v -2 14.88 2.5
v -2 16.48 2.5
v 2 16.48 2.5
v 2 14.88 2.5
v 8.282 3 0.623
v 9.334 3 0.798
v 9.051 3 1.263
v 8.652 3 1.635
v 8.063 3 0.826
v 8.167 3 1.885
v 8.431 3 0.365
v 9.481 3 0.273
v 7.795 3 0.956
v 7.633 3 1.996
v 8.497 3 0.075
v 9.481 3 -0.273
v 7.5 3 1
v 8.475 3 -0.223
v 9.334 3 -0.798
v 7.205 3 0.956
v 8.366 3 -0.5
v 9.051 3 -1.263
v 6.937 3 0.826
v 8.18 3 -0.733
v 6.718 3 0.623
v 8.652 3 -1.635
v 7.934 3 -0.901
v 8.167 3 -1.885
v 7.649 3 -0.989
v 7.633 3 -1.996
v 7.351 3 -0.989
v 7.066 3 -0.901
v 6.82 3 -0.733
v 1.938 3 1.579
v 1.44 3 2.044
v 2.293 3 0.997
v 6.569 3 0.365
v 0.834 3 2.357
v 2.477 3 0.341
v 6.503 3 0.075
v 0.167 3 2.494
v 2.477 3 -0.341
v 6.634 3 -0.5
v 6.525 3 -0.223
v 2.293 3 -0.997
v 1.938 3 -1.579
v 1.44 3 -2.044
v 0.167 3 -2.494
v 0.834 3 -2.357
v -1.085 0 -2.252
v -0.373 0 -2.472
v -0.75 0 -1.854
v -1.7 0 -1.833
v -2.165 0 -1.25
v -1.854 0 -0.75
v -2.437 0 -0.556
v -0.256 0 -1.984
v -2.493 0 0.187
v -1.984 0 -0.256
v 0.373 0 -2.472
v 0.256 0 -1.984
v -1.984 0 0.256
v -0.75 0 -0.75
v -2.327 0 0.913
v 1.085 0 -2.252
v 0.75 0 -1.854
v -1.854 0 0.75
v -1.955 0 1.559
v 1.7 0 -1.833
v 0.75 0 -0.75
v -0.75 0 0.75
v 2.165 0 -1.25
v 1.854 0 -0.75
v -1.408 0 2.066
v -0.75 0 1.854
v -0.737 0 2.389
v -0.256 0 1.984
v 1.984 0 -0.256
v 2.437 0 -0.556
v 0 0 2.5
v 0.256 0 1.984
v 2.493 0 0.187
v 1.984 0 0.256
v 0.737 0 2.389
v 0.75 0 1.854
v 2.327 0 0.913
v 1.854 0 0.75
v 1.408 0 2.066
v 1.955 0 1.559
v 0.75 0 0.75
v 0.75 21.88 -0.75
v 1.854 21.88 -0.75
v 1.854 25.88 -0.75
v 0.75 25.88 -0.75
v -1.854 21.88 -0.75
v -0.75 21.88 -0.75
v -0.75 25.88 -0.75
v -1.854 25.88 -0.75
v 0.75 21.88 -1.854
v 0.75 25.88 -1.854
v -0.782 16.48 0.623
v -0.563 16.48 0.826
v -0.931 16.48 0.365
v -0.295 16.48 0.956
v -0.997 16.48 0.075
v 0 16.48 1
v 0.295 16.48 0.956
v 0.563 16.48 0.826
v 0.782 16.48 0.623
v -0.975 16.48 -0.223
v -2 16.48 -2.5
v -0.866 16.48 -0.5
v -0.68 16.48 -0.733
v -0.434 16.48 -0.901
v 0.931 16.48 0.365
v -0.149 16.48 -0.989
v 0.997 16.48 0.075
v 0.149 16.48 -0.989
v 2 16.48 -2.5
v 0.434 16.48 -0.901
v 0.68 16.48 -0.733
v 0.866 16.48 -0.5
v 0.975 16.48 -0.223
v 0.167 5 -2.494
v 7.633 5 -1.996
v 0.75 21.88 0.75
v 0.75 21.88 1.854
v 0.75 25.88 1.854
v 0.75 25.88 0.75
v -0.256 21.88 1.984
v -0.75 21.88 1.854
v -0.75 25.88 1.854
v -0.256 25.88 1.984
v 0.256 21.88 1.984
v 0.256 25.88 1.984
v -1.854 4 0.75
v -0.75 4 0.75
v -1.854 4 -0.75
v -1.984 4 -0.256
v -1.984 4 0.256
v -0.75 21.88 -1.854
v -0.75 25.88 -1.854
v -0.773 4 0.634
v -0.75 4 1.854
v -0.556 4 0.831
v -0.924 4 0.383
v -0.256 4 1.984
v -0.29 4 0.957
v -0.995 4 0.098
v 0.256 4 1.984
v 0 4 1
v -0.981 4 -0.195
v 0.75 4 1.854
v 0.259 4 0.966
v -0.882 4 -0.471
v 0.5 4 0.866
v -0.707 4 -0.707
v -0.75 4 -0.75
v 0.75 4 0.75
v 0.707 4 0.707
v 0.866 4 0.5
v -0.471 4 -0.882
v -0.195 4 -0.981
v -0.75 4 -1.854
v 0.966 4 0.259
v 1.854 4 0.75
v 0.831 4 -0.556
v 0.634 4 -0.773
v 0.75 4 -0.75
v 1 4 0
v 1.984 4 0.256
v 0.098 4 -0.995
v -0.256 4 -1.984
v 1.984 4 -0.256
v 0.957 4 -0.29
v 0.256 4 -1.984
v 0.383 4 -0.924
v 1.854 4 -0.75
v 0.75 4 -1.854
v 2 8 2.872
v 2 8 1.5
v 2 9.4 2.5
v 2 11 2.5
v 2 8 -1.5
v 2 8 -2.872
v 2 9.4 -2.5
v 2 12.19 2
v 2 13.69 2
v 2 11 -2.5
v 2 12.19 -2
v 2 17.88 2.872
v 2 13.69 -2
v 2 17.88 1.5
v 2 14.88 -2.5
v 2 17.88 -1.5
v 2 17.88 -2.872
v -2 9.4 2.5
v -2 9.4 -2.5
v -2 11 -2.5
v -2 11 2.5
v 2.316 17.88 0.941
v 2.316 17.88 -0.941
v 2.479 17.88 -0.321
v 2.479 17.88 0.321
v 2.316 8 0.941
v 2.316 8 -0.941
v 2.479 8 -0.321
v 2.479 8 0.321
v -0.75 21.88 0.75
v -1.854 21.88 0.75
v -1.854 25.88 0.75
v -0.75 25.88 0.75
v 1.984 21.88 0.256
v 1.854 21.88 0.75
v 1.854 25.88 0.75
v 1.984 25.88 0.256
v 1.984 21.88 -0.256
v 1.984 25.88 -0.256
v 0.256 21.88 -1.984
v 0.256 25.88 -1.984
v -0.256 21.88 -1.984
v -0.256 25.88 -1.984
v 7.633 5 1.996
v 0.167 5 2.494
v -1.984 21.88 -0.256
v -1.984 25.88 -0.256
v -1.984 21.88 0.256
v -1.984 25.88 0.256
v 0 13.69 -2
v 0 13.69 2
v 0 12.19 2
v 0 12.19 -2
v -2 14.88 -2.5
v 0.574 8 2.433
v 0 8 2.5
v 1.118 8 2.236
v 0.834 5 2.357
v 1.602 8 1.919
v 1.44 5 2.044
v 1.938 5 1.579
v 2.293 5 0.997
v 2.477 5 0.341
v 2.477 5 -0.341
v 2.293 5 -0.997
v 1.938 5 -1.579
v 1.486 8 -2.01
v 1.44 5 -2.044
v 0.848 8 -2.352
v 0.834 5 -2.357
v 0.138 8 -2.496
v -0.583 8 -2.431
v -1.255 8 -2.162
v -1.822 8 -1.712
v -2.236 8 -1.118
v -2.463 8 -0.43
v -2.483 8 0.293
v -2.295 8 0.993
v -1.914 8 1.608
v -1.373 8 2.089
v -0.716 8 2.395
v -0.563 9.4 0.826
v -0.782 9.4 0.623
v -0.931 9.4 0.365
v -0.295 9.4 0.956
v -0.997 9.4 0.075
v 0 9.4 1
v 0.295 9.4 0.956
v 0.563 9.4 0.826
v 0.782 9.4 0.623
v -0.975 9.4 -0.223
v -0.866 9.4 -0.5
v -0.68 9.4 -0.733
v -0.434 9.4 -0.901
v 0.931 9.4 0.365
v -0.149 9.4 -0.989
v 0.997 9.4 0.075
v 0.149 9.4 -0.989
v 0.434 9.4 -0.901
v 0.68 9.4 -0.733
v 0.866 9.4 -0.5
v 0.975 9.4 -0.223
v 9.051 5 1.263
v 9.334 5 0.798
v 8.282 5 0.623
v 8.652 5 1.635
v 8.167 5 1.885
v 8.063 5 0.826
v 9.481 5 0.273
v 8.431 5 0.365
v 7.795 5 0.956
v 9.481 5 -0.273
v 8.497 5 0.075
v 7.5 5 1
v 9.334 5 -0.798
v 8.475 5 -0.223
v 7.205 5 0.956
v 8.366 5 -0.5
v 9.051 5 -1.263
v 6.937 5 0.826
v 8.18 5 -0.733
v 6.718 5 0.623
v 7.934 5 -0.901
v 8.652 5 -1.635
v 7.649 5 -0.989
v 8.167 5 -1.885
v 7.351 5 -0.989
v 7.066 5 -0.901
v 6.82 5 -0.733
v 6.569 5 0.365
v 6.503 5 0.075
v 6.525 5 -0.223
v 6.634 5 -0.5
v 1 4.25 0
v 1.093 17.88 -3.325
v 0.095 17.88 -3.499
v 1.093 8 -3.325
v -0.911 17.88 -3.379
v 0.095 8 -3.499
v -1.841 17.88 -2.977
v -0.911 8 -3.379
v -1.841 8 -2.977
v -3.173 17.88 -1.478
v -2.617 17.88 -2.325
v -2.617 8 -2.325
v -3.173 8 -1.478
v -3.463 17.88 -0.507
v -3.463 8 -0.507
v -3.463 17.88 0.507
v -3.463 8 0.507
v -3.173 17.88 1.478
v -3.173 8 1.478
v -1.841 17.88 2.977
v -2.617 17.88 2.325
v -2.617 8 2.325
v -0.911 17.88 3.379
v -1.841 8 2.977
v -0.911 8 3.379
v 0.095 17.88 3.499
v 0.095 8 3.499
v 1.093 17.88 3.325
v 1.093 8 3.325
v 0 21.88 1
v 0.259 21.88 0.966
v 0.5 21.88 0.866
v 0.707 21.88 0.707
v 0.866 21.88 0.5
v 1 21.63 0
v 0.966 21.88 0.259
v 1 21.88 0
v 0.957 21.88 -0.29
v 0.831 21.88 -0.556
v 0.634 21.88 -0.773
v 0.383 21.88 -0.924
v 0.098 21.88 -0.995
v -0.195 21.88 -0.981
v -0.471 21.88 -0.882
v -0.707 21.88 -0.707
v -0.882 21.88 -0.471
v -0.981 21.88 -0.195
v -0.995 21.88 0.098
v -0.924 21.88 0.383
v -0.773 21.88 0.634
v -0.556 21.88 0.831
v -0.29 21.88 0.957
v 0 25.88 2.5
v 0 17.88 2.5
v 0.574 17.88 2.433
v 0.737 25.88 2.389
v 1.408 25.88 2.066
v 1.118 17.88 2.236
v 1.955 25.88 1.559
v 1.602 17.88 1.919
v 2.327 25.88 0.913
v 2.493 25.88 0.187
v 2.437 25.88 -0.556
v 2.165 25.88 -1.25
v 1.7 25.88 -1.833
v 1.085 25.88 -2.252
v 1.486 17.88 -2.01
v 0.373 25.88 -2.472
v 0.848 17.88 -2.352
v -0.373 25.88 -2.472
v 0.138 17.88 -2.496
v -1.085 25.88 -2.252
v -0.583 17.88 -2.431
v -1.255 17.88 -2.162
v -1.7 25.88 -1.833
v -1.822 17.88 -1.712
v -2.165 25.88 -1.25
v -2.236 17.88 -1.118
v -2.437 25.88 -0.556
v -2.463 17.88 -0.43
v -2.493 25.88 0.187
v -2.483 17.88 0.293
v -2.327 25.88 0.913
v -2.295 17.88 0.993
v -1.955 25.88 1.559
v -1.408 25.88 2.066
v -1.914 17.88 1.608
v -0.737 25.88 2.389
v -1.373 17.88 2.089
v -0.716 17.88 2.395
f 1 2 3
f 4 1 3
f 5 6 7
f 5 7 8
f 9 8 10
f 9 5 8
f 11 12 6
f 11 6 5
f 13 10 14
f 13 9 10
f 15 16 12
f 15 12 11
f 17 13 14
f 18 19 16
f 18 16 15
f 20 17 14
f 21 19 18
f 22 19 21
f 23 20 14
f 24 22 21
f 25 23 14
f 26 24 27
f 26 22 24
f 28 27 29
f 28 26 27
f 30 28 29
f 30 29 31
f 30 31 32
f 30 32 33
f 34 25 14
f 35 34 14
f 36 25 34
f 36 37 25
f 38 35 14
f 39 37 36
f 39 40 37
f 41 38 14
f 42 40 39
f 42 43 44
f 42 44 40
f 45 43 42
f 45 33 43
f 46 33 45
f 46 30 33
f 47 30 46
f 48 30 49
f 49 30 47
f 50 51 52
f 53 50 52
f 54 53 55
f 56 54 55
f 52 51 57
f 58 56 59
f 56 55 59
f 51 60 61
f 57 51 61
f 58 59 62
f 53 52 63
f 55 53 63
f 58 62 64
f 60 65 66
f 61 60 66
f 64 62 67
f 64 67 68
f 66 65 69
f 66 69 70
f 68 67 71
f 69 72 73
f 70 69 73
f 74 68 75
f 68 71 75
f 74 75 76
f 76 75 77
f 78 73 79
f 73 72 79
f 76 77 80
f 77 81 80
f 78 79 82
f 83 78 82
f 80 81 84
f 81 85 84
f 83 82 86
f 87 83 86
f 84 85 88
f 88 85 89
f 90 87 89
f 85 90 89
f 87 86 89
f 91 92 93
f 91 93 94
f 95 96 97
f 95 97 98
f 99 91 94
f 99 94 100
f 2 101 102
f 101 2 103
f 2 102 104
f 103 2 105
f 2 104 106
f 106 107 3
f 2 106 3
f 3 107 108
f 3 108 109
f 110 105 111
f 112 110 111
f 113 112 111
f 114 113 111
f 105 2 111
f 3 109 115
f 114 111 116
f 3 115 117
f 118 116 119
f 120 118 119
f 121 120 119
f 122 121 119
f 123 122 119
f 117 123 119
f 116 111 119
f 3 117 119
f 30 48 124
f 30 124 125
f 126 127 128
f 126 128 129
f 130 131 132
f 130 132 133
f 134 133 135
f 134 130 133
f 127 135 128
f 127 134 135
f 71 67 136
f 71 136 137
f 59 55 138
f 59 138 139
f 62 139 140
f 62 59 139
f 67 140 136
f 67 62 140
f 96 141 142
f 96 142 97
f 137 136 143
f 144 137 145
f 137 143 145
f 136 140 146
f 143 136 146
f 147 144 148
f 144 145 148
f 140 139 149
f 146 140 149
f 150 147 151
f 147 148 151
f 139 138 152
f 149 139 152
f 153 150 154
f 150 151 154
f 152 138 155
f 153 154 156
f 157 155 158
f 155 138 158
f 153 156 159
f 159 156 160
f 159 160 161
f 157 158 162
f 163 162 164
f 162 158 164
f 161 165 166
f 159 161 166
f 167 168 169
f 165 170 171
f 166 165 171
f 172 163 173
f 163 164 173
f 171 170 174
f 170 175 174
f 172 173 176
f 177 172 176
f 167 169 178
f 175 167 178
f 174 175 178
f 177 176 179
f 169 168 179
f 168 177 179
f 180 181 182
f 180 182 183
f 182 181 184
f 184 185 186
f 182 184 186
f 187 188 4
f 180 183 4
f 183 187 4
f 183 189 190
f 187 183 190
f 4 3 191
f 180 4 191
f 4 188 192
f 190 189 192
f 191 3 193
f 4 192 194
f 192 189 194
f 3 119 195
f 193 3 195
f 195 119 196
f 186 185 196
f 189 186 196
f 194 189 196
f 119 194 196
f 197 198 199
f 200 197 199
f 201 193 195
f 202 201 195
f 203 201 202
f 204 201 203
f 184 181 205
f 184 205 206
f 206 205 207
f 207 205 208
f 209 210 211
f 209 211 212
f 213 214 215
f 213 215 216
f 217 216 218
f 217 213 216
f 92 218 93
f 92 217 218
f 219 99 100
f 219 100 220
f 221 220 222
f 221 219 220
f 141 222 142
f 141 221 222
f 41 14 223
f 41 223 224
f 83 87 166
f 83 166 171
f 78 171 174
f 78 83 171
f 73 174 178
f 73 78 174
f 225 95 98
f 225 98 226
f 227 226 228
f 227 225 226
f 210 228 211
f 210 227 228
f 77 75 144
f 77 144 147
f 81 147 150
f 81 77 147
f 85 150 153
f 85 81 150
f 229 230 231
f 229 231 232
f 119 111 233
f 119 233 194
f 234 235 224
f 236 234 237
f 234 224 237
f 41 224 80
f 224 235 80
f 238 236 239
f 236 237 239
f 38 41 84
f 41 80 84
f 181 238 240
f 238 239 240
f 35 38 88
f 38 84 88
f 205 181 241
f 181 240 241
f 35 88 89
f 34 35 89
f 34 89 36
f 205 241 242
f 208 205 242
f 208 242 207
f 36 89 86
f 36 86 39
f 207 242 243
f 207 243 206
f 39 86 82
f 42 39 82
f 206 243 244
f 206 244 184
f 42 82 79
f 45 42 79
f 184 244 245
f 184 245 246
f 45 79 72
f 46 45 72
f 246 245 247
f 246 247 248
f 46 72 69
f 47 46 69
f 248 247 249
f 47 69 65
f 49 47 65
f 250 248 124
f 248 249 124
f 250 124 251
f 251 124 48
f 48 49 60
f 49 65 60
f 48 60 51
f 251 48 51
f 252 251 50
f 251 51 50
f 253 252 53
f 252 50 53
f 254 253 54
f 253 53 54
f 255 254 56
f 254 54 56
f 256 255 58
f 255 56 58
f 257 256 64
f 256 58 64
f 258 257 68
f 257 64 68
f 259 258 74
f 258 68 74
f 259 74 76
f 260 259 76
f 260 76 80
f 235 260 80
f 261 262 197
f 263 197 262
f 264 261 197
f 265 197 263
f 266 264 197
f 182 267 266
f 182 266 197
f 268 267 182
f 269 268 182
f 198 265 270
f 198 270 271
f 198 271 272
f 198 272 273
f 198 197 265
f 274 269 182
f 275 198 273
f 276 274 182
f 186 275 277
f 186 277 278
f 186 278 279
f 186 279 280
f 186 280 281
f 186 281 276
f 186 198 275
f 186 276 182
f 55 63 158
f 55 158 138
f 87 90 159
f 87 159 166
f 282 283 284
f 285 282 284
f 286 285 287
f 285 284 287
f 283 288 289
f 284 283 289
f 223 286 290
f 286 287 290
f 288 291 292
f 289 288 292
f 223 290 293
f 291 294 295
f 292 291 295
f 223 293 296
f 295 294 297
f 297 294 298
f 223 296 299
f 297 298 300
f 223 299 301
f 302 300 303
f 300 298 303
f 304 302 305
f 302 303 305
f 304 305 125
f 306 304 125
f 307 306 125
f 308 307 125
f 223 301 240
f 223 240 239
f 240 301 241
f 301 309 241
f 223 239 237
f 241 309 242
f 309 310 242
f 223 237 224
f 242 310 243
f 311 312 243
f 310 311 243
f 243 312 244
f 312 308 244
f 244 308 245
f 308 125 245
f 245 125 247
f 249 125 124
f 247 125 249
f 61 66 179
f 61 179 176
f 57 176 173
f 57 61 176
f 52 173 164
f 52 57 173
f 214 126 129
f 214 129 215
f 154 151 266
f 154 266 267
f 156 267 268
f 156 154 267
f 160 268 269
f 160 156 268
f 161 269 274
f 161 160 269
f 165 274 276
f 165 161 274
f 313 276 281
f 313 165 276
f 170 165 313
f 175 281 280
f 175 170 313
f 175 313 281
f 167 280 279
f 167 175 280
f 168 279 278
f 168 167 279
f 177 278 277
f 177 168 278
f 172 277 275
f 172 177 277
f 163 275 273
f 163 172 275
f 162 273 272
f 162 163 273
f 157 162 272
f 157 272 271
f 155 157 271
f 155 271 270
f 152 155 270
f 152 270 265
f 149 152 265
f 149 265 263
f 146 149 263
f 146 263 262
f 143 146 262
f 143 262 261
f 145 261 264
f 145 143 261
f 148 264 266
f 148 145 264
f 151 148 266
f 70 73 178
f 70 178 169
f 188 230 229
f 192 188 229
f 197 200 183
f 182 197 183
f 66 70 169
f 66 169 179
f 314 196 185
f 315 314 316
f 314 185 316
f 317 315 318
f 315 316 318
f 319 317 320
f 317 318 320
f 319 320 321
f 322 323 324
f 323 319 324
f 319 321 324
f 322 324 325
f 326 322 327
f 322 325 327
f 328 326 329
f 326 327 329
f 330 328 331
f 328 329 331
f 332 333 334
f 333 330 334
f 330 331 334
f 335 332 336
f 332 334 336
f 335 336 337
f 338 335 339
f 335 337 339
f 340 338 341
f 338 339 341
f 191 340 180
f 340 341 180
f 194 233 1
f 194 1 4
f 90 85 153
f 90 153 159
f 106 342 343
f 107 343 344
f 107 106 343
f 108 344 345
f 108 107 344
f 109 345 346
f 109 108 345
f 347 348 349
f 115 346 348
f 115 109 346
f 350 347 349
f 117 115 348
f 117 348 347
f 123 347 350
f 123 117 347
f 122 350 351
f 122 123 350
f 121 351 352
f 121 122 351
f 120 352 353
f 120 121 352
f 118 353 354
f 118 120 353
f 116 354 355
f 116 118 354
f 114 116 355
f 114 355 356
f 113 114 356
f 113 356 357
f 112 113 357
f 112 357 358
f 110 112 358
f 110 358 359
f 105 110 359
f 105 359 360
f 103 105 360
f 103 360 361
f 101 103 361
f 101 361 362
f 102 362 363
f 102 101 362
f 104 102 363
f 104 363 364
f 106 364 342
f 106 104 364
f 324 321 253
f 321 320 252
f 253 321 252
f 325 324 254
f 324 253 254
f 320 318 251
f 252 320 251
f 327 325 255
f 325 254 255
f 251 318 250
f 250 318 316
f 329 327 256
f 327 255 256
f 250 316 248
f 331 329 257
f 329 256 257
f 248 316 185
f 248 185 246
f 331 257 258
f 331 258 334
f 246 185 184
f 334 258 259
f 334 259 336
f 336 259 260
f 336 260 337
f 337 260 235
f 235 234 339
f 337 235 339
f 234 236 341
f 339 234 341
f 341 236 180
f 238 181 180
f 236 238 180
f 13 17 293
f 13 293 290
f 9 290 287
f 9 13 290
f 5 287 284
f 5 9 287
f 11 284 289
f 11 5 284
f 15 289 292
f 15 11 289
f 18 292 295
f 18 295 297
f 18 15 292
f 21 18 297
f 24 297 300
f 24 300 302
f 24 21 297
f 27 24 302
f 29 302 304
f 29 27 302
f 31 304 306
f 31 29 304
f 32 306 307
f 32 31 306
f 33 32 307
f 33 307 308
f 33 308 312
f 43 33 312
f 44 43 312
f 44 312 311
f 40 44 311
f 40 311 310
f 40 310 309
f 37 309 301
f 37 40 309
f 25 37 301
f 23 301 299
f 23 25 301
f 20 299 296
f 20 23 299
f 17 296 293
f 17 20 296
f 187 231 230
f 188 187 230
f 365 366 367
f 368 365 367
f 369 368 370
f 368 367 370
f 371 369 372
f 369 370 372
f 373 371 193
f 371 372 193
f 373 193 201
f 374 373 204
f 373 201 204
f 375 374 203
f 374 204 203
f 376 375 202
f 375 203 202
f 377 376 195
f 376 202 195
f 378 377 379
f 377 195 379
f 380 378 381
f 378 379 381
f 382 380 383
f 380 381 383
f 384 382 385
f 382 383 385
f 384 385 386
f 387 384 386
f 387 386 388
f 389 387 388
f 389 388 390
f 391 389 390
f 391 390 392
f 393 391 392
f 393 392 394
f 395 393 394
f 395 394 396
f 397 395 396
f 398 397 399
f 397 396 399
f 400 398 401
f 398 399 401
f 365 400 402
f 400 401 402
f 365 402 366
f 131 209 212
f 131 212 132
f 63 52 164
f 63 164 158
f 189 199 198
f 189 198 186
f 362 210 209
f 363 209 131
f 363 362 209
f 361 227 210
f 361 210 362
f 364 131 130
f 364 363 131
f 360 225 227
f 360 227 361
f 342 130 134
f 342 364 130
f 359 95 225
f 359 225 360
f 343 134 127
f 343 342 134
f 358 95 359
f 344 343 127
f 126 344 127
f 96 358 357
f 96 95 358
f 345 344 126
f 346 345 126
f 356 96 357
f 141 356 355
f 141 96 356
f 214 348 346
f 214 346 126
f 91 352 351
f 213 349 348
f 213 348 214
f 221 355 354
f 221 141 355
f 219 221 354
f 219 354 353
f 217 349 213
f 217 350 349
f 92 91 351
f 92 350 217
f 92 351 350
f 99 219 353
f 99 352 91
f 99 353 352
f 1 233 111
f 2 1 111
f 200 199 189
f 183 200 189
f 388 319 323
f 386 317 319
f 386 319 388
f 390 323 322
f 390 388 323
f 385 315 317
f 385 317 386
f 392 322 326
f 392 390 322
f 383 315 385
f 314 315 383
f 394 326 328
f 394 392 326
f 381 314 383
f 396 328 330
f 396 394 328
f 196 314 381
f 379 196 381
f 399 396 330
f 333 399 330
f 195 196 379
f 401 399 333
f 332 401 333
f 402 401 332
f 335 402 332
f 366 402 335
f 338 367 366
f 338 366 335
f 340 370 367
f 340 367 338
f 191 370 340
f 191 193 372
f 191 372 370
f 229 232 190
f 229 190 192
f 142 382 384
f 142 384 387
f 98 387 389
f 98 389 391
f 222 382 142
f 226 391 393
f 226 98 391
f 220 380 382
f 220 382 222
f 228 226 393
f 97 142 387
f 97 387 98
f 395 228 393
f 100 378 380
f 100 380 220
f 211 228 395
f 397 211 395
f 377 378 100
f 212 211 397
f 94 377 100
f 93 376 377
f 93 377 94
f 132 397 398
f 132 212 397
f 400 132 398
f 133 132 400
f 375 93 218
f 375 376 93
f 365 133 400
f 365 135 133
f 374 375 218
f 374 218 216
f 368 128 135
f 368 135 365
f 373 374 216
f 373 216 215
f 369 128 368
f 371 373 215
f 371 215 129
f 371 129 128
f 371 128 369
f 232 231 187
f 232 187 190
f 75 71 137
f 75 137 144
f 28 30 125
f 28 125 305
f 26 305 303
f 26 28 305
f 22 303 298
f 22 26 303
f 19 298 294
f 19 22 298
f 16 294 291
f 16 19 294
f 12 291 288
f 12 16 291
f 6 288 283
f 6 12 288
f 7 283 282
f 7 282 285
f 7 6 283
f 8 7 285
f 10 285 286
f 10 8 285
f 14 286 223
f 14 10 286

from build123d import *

# Parameters (mm, degrees)
SKETCH_1_R                = 2.5
EXTRUDE_1_DEPTH           = 25.88
EXTRUDE_START             = 3
SKETCH_2_R                = 1
EXTRUDE_2_DEPTH           = 2
CUT_EXTRUDE_1_DEPTH       = 4
CUT_EXTRUDE_START         = 21.88
CUT_EXTRUDE_2_DEPTH       = 4
SKETCH_6_R                = 0.25
CUT_EXTRUDE_3_DEPTH       = 0.25
CUT_EXTRUDE_START_2       = 4.25
SKETCH_7_R                = 0.25
CUT_EXTRUDE_4_DEPTH       = 0.25
EXTRUDE_START_2           = 8
SKETCH_17_R               = 3.5
EXTRUDE_5_DEPTH           = 9.88
SKETCH_18_R               = 1
CUT_EXTRUDE_11_DEPTH      = 10
CUT_EXTRUDE_START_3       = 15.88
SKETCH_19_R               = 1
CUT_EXTRUDE_12_DEPTH      = 10
CUT_EXTRUDE_13_DEPTH      = 2.5
CUT_EXTRUDE_13_DEPTH_BACK = 2.5
SKETCH_20_W               = 4
SKETCH_20_H               = 1.6
CUT_EXTRUDE_14_DEPTH      = 28.789825476
CUT_EXTRUDE_14_DEPTH_BACK = 28.789825476
SKETCH_21_W               = 1.5
SKETCH_21_H               = 9.88
SKETCH_22_W               = 4
SKETCH_22_H               = 1.5
CUT_EXTRUDE_15_DEPTH      = 28.789825476


with BuildPart() as part:
    # 草图1 → 凸台-拉伸1 (new body)
    with BuildSketch(Plane(origin=(0, 0, 0), x_dir=(1, 0, 0), z_dir=(0, 1, 0))):
        with Locations(Location((0, 0, 0), (0, 0, 270))):
            Circle(SKETCH_1_R)
    extrude(amount=EXTRUDE_1_DEPTH)

    # 草图2 → 凸台-拉伸2 (add)
    with BuildSketch(Plane(origin=(0, 0, 0), x_dir=(1, 0, 0), z_dir=(0, 1, 0)).offset(EXTRUDE_START)):
        with BuildLine():
            Line((0.166666667, 2.494438258), (7.633333333, 1.995550606))
            ThreePointArc((7.633333333, 1.995550606), (9.5, 0), (7.633333333, -1.995550606))
            Line((7.633333333, -1.995550606), (0.166666667, -2.494438258))
            ThreePointArc((0.166666667, -2.494438258), (-2.5, 0), (0.166666667, 2.494438258))
        make_face()
        with Locations(Location((7.5, 0, 0), (0, 0, 270))):
            Circle(SKETCH_2_R, mode=Mode.SUBTRACT)
    extrude(amount=EXTRUDE_2_DEPTH)

    # 草图3 → 切除-拉伸1 (cut)
    with BuildSketch(Plane(origin=(0, 0, 0), x_dir=(1, 0, 0), z_dir=(0, 1, 0))):
        with BuildLine():
            Line((-1.854049622, -0.75), (-0.75, -0.75))
            Line((-0.75, -0.75), (-0.75, -1.854049622))
            ThreePointArc((-0.75, -1.854049622), (0, -2), (0.75, -1.854049622))
            Line((0.75, -1.854049622), (0.75, -0.75))
            Line((0.75, -0.75), (1.854049622, -0.75))
            ThreePointArc((1.854049622, -0.75), (2, 0), (1.854049622, 0.75))
            Line((1.854049622, 0.75), (0.75, 0.75))
            Line((0.75, 0.75), (0.75, 1.854049622))
            ThreePointArc((0.75, 1.854049622), (0, 2), (-0.75, 1.854049622))
            Line((-0.75, 1.854049622), (-0.75, 0.75))
            Line((-0.75, 0.75), (-1.854049622, 0.75))
            ThreePointArc((-1.854049622, 0.75), (-2, 0), (-1.854049622, -0.75))
        make_face()
    extrude(amount=CUT_EXTRUDE_1_DEPTH, mode=Mode.SUBTRACT)

    # 草图5 → 切除-拉伸2 (cut)
    with BuildSketch(Plane(origin=(0, 0, 0), x_dir=(1, 0, 0), z_dir=(0, 1, 0)).offset(CUT_EXTRUDE_START)):
        with BuildLine():
            Line((1.854049622, 0.75), (0.75, 0.75))
            Line((0.75, 0.75), (0.75, 1.854049622))
            ThreePointArc((0.75, 1.854049622), (0, 2), (-0.75, 1.854049622))
            Line((-0.75, 1.854049622), (-0.75, 0.75))
            Line((-0.75, 0.75), (-1.854049622, 0.75))
            ThreePointArc((-1.854049622, 0.75), (-2, 0), (-1.854049622, -0.75))
            Line((-1.854049622, -0.75), (-0.75, -0.75))
            Line((-0.75, -0.75), (-0.75, -1.854049622))
            ThreePointArc((-0.75, -1.854049622), (0, -2), (0.75, -1.854049622))
            Line((0.75, -1.854049622), (0.75, -0.75))
            Line((0.75, -0.75), (1.854049622, -0.75))
            ThreePointArc((1.854049622, -0.75), (2, 0), (1.854049622, 0.75))
        make_face()
    extrude(amount=CUT_EXTRUDE_2_DEPTH, mode=Mode.SUBTRACT)

    # 草图6 → 切除-拉伸3 (cut)
    with BuildSketch(Plane(origin=(0, 0, 0), x_dir=(1, 0, 0), z_dir=(0, 1, 0)).offset(CUT_EXTRUDE_START)):
        with Locations(Location((0.75, 0, 0), (0, 0, 270))):
            Circle(SKETCH_6_R)
    extrude(amount=-CUT_EXTRUDE_3_DEPTH, mode=Mode.SUBTRACT)

    # 草图7 → 切除-拉伸4 (cut)
    with BuildSketch(Plane(origin=(0, 0, 0), x_dir=(1, 0, 0), z_dir=(0, 1, 0)).offset(CUT_EXTRUDE_START_2)):
        with Locations(Location((0.75, 0, 0), (0, 0, 270))):
            Circle(SKETCH_7_R)
    extrude(amount=-CUT_EXTRUDE_4_DEPTH, mode=Mode.SUBTRACT)

    # 草图17 → 凸台-拉伸5 (add)
    with BuildSketch(Plane(origin=(0, 0, 0), x_dir=(1, 0, 0), z_dir=(0, 1, 0)).offset(EXTRUDE_START_2)):
        with Locations(Location((0, 0, 0), (0, 0, 270))):
            Circle(SKETCH_17_R)
    extrude(amount=EXTRUDE_5_DEPTH)

    # 草图18 → 切除-拉伸11 (cut)
    with BuildSketch(Plane(origin=(0, 0, 0), x_dir=(1, 0, 0), z_dir=(0, 1, 0))):
        with Locations(Location((0, 0, 0), (0, 0, 270))):
            Circle(SKETCH_18_R)
    extrude(amount=CUT_EXTRUDE_11_DEPTH, mode=Mode.SUBTRACT)

    # 草图19 → 切除-拉伸12 (cut)
    with BuildSketch(Plane(origin=(0, 0, 0), x_dir=(1, 0, 0), z_dir=(0, 1, 0)).offset(CUT_EXTRUDE_START_3)):
        with Locations(Location((0, 0, 0), (0, 0, 270))):
            Circle(SKETCH_19_R)
    extrude(amount=CUT_EXTRUDE_12_DEPTH, mode=Mode.SUBTRACT)

    # 草图20 → 切除-拉伸13 (cut, two sides: drawn at the far end of the back side and taken through both)
    with BuildSketch(Plane.XY.offset(-CUT_EXTRUDE_13_DEPTH_BACK)):
        with Locations((0, 15.68)):
            Rectangle(SKETCH_20_W, SKETCH_20_H)
        with Locations((0, 10.2)):
            Rectangle(SKETCH_20_W, SKETCH_20_H)
    extrude(amount=CUT_EXTRUDE_13_DEPTH + CUT_EXTRUDE_13_DEPTH_BACK, mode=Mode.SUBTRACT)

    # 草图21 → 切除-拉伸14 (cut, two sides: drawn at the far end of the back side and taken through both)
    with BuildSketch(Plane.XY.offset(-CUT_EXTRUDE_14_DEPTH_BACK)):
        with Locations((2.75, 12.94)):
            Rectangle(SKETCH_21_W, SKETCH_21_H)
    extrude(amount=CUT_EXTRUDE_14_DEPTH + CUT_EXTRUDE_14_DEPTH_BACK, mode=Mode.SUBTRACT)

    # 草图22 → 切除-拉伸15 (cut, through all)
    with BuildSketch(Plane(origin=(0, 0, 0), x_dir=(0, 0, -1), z_dir=(1, 0, 0))):
        with Locations((0, 12.94)):
            Rectangle(SKETCH_22_W, SKETCH_22_H)
    extrude(amount=CUT_EXTRUDE_15_DEPTH, mode=Mode.SUBTRACT)


solid = part.part
